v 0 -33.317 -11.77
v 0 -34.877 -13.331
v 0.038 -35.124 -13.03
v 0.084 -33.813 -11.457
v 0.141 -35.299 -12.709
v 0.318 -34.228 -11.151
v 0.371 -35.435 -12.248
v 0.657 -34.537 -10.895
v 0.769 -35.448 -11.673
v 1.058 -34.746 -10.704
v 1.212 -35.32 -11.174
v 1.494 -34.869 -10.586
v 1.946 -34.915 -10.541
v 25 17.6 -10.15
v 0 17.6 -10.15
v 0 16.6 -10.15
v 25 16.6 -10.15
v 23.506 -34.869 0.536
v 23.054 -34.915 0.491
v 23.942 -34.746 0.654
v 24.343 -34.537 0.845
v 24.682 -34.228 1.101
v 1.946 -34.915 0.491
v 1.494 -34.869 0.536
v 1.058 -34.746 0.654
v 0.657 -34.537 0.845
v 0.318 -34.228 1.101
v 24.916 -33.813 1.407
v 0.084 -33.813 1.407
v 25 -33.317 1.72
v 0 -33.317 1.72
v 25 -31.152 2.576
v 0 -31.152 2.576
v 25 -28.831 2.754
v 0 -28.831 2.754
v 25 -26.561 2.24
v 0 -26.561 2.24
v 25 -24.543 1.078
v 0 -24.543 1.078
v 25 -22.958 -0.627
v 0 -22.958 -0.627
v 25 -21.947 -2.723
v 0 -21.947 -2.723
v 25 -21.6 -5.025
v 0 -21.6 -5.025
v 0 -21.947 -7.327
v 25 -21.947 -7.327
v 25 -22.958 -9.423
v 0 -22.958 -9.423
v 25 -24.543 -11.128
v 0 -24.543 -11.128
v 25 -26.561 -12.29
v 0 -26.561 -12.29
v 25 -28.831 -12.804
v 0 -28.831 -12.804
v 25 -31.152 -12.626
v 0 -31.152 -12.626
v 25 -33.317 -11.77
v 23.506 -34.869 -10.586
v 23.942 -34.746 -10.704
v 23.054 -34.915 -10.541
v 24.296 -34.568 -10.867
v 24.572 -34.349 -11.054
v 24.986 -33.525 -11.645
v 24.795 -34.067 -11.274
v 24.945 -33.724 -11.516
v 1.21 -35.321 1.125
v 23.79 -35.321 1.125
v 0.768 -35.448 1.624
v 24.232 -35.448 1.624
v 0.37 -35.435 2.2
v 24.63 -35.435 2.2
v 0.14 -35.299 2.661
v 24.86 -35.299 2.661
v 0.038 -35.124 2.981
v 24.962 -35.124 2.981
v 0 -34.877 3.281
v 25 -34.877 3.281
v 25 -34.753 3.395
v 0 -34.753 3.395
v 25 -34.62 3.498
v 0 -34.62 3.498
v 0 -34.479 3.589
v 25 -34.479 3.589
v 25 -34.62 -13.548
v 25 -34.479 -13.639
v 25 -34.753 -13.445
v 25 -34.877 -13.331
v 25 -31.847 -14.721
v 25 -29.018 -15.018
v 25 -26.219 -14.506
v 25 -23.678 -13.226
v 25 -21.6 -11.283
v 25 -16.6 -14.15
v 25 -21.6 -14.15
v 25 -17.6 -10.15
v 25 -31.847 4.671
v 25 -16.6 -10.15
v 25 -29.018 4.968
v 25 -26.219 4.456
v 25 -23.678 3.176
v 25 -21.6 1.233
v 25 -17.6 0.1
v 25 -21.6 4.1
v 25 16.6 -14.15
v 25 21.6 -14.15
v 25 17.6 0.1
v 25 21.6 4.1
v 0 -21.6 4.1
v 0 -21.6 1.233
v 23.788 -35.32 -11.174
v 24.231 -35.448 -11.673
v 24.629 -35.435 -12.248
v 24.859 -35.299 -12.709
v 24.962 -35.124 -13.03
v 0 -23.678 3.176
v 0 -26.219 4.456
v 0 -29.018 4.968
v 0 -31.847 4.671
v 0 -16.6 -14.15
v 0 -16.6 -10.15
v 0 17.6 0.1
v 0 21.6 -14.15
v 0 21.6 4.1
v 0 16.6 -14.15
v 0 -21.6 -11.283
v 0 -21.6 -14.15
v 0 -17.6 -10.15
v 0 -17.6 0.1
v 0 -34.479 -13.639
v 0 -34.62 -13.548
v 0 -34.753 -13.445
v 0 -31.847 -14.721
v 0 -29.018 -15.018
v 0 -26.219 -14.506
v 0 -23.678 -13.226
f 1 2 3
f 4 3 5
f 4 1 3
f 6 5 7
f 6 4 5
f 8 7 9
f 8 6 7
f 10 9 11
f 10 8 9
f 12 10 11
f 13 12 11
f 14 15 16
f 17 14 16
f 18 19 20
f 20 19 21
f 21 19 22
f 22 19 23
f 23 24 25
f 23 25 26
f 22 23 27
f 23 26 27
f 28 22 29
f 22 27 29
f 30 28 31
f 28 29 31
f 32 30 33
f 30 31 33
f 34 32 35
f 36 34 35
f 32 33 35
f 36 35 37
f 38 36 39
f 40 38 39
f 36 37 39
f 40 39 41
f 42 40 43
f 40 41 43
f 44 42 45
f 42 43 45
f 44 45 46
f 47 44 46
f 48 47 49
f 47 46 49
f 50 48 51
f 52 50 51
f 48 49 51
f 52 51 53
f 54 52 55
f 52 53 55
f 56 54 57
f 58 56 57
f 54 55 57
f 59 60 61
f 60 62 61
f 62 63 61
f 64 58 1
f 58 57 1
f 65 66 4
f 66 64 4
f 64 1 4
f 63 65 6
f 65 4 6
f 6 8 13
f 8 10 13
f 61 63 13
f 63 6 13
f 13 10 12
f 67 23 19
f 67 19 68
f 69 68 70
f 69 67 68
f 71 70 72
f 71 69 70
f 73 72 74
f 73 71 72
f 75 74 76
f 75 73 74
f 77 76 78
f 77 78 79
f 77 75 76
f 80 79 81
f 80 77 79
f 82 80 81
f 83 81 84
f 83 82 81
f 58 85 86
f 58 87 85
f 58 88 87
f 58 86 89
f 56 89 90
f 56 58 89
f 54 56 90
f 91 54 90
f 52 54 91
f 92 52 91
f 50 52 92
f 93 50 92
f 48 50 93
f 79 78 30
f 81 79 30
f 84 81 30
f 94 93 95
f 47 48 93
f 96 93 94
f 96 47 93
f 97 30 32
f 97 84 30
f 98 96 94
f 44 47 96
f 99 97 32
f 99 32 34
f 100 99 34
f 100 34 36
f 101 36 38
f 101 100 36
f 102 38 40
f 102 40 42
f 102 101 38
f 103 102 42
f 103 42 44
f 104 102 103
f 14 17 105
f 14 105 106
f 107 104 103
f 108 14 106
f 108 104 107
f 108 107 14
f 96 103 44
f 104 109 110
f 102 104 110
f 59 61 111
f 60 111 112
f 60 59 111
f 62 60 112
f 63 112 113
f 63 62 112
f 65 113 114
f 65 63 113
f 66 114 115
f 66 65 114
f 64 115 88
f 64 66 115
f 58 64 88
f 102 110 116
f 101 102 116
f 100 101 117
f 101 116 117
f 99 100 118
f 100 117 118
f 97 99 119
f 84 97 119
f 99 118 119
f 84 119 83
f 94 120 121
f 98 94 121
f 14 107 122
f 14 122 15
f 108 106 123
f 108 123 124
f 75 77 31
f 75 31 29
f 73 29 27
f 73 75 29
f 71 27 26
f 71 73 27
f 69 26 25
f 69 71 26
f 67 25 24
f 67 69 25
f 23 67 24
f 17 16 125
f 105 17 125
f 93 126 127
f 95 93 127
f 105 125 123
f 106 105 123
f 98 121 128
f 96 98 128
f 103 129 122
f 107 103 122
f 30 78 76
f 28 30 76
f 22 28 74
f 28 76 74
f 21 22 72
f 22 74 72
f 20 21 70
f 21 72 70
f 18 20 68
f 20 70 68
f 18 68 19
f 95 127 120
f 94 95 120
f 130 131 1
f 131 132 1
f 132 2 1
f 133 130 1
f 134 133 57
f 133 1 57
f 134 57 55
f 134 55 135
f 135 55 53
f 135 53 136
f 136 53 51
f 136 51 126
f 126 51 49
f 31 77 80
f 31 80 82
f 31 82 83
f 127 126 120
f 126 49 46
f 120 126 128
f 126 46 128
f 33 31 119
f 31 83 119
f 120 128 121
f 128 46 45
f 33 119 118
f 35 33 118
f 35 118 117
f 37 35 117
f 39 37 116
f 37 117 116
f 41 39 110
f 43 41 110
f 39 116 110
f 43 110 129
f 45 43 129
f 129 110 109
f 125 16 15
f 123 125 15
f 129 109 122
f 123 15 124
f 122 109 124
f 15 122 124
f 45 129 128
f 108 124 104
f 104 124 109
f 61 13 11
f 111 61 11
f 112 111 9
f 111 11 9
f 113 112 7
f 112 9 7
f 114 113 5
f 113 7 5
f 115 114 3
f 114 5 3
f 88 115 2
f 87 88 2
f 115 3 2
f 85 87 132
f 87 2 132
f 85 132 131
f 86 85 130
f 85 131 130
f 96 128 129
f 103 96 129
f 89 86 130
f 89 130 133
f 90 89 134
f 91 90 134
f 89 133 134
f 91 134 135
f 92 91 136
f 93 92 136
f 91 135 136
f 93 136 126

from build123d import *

# Parameters (mm, degrees)
F1_DEPTH    = 25
F2_DEPTH    = 25
F3_T1_DEPTH = 12.2
F3_T3_DEPTH = 12.2
F3_T5_DEPTH = 12.2
F3_T7_DEPTH = 12.2
F4_T1_DEPTH = 33.6004292483


# Not quite as in the source:
# - a fillet or chamfer that OpenCascade refuses, or shapes differently, is made with other operations: its cross-section is extruded or revolved along the edge and cut away or added


with BuildPart() as f1:
    # F0 (on Right) → F1 (new body)
    with BuildSketch(Plane.YZ):
        with BuildLine():
            Line((17.6, 0.1), (17.6, -10.15))
            Line((17.6, -10.15), (16.6, -10.15))
            Line((16.6, -10.15), (16.6, -14.15))
            Line((16.6, -14.15), (21.6, -14.15))
            Line((21.6, -14.15), (21.6, 4.1))
            Line((21.6, 4.1), (0, 4.1))
            Line((0, 4.1), (-21.6, 4.1))
            Line((-21.6, 4.1), (-21.6, 1.2327951389))
            ThreePointArc((-21.6, 1.2327951389), (-19.9660188679, -1.7083752096), (-19.4, -5.025))
            ThreePointArc((-19.4, -5.025), (-19.9660188679, -8.3416247904), (-21.6, -11.2827951389))
            Line((-21.6, -11.2827951389), (-21.6, -14.15))
            Line((-21.6, -14.15), (-16.6, -14.15))
            Line((-16.6, -14.15), (-16.6, -10.15))
            Line((-16.6, -10.15), (-17.6, -10.15))
            Line((-17.6, -10.15), (-17.6, 0.1))
            Line((-17.6, 0.1), (0, 0.1))
            Line((0, 0.1), (17.6, 0.1))
        make_face()
    extrude(amount=F1_DEPTH)

    # F0 (on Right) → F2 (join)
    with BuildSketch(Plane.YZ):
        with BuildLine():
            Line((-21.6, -5.025), (-21.6, 1.2327951389))
            ThreePointArc((-21.6, 1.2327951389), (-28.8539334803, 4.9600794366), (-36.4710678119, 2.0460678119))
            Line((-36.4710678119, 2.0460678119), (-34.9154328933, 0.4904328933))
            ThreePointArc((-34.9154328933, 0.4904328933), (-26.4150692276, 2.1812603536), (-21.6, -5.025))
        make_face()
        with BuildLine():
            Line((-21.6, -11.2827951389), (-21.6, -5.025))
            ThreePointArc((-21.6, -5.025), (-26.4150692276, -12.2312603536), (-34.9154328933, -10.5404328933))
            Line((-34.9154328933, -10.5404328933), (-36.4710678119, -12.0960678119))
            ThreePointArc((-36.4710678119, -12.0960678119), (-28.8539334803, -15.0100794366), (-21.6, -11.2827951389))
        make_face()
        with BuildLine():
            ThreePointArc((-19.4, -5.025), (-19.9660188679, -1.7083752096), (-21.6, 1.2327951389))
            Line((-21.6, 1.2327951389), (-21.6, -5.025))
            Line((-21.6, -5.025), (-21.6, -11.2827951389))
            ThreePointArc((-21.6, -11.2827951389), (-19.9660188679, -8.3416247904), (-19.4, -5.025))
        make_face()
    extrude(amount=F2_DEPTH)

    # F3: fillet of radius 2 on 4 edges, made by hand

    # F3_s2 → F3_t1 (cut)
    with BuildSketch(Plane(origin=(0, -19.1923989873, -19.1923989873), x_dir=(1, 0, 0), z_dir=(0, -0.7071067812, -0.7071067812))):
        with BuildLine():
            ThreePointArc((23, 17.2357277914), (24.4142135624, 16.6499413538), (25, 15.2357277914))
            Line((25, 15.2357277914), (25, 17.2357277914))
            Line((25, 17.2357277914), (23, 17.2357277914))
        make_face()
    extrude(amount=F3_T1_DEPTH, mode=Mode.SUBTRACT)

    # F3_s4 → F3_t3 (cut)
    with BuildSketch(Plane(origin=(0, -19.1923989873, -19.1923989873), x_dir=(1, 0, 0), z_dir=(0, -0.7071067812, -0.7071067812))):
        with BuildLine():
            ThreePointArc((0, 15.2357277914), (0.5857864376, 16.6499413538), (2, 17.2357277914))
            Line((2, 17.2357277914), (0, 17.2357277914))
            Line((0, 17.2357277914), (0, 15.2357277914))
        make_face()
    extrude(amount=F3_T3_DEPTH, mode=Mode.SUBTRACT)

    # F3_s6 → F3_t5 (cut)
    with BuildSketch(Plane(origin=(0, -22.7941017178, 22.7941017178), x_dir=(1, 0, 0), z_dir=(0, 0.7071067812, -0.7071067812))):
        with BuildLine():
            ThreePointArc((25, 22.3421509423), (24.4142135624, 23.7563645047), (23, 24.3421509423))
            Line((23, 24.3421509423), (25, 24.3421509423))
            Line((25, 24.3421509423), (25, 22.3421509423))
        make_face()
    extrude(amount=F3_T5_DEPTH, mode=Mode.SUBTRACT)

    # F3_s8 → F3_t7 (cut)
    with BuildSketch(Plane(origin=(0, -22.7941017178, 22.7941017178), x_dir=(1, 0, 0), z_dir=(0, 0.7071067812, -0.7071067812))):
        with BuildLine():
            ThreePointArc((0, 22.3421509423), (0.5857864376, 23.7563645047), (2, 24.3421509423))
            Line((2, 24.3421509423), (0, 24.3421509423))
            Line((0, 24.3421509423), (0, 22.3421509423))
        make_face()
    extrude(amount=F3_T7_DEPTH, mode=Mode.SUBTRACT)

    # F4: fillet of radius 2 on 2 edges, made by hand

    # F4_s2 → F4_t1 (cut)
    with BuildSketch(Plane.YZ.offset(-4.3002146241)):
        with BuildLine():
            ThreePointArc((-34.8772255751, 0.4522255751), (-35.4470714052, 2.1184477224), (-34.4787650158, 3.5892989218))
            ThreePointArc((-34.4787650158, 3.5892989218), (-35.523724357, 2.8806941504), (-36.4710678119, 2.0460678119))
            Line((-36.4710678119, 2.0460678119), (-34.8772255751, 0.4522255751))
        make_face()
        with BuildLine():
            ThreePointArc((-34.8772255751, -10.5022255751), (-35.4470714052, -12.1684477224), (-34.4787650158, -13.6392989218))
            ThreePointArc((-34.4787650158, -13.6392989218), (-35.523724357, -12.9306941504), (-36.4710678119, -12.0960678119))
            Line((-36.4710678119, -12.0960678119), (-34.8772255751, -10.5022255751))
        make_face()
    extrude(amount=F4_T1_DEPTH, mode=Mode.SUBTRACT)


solid = f1.part
